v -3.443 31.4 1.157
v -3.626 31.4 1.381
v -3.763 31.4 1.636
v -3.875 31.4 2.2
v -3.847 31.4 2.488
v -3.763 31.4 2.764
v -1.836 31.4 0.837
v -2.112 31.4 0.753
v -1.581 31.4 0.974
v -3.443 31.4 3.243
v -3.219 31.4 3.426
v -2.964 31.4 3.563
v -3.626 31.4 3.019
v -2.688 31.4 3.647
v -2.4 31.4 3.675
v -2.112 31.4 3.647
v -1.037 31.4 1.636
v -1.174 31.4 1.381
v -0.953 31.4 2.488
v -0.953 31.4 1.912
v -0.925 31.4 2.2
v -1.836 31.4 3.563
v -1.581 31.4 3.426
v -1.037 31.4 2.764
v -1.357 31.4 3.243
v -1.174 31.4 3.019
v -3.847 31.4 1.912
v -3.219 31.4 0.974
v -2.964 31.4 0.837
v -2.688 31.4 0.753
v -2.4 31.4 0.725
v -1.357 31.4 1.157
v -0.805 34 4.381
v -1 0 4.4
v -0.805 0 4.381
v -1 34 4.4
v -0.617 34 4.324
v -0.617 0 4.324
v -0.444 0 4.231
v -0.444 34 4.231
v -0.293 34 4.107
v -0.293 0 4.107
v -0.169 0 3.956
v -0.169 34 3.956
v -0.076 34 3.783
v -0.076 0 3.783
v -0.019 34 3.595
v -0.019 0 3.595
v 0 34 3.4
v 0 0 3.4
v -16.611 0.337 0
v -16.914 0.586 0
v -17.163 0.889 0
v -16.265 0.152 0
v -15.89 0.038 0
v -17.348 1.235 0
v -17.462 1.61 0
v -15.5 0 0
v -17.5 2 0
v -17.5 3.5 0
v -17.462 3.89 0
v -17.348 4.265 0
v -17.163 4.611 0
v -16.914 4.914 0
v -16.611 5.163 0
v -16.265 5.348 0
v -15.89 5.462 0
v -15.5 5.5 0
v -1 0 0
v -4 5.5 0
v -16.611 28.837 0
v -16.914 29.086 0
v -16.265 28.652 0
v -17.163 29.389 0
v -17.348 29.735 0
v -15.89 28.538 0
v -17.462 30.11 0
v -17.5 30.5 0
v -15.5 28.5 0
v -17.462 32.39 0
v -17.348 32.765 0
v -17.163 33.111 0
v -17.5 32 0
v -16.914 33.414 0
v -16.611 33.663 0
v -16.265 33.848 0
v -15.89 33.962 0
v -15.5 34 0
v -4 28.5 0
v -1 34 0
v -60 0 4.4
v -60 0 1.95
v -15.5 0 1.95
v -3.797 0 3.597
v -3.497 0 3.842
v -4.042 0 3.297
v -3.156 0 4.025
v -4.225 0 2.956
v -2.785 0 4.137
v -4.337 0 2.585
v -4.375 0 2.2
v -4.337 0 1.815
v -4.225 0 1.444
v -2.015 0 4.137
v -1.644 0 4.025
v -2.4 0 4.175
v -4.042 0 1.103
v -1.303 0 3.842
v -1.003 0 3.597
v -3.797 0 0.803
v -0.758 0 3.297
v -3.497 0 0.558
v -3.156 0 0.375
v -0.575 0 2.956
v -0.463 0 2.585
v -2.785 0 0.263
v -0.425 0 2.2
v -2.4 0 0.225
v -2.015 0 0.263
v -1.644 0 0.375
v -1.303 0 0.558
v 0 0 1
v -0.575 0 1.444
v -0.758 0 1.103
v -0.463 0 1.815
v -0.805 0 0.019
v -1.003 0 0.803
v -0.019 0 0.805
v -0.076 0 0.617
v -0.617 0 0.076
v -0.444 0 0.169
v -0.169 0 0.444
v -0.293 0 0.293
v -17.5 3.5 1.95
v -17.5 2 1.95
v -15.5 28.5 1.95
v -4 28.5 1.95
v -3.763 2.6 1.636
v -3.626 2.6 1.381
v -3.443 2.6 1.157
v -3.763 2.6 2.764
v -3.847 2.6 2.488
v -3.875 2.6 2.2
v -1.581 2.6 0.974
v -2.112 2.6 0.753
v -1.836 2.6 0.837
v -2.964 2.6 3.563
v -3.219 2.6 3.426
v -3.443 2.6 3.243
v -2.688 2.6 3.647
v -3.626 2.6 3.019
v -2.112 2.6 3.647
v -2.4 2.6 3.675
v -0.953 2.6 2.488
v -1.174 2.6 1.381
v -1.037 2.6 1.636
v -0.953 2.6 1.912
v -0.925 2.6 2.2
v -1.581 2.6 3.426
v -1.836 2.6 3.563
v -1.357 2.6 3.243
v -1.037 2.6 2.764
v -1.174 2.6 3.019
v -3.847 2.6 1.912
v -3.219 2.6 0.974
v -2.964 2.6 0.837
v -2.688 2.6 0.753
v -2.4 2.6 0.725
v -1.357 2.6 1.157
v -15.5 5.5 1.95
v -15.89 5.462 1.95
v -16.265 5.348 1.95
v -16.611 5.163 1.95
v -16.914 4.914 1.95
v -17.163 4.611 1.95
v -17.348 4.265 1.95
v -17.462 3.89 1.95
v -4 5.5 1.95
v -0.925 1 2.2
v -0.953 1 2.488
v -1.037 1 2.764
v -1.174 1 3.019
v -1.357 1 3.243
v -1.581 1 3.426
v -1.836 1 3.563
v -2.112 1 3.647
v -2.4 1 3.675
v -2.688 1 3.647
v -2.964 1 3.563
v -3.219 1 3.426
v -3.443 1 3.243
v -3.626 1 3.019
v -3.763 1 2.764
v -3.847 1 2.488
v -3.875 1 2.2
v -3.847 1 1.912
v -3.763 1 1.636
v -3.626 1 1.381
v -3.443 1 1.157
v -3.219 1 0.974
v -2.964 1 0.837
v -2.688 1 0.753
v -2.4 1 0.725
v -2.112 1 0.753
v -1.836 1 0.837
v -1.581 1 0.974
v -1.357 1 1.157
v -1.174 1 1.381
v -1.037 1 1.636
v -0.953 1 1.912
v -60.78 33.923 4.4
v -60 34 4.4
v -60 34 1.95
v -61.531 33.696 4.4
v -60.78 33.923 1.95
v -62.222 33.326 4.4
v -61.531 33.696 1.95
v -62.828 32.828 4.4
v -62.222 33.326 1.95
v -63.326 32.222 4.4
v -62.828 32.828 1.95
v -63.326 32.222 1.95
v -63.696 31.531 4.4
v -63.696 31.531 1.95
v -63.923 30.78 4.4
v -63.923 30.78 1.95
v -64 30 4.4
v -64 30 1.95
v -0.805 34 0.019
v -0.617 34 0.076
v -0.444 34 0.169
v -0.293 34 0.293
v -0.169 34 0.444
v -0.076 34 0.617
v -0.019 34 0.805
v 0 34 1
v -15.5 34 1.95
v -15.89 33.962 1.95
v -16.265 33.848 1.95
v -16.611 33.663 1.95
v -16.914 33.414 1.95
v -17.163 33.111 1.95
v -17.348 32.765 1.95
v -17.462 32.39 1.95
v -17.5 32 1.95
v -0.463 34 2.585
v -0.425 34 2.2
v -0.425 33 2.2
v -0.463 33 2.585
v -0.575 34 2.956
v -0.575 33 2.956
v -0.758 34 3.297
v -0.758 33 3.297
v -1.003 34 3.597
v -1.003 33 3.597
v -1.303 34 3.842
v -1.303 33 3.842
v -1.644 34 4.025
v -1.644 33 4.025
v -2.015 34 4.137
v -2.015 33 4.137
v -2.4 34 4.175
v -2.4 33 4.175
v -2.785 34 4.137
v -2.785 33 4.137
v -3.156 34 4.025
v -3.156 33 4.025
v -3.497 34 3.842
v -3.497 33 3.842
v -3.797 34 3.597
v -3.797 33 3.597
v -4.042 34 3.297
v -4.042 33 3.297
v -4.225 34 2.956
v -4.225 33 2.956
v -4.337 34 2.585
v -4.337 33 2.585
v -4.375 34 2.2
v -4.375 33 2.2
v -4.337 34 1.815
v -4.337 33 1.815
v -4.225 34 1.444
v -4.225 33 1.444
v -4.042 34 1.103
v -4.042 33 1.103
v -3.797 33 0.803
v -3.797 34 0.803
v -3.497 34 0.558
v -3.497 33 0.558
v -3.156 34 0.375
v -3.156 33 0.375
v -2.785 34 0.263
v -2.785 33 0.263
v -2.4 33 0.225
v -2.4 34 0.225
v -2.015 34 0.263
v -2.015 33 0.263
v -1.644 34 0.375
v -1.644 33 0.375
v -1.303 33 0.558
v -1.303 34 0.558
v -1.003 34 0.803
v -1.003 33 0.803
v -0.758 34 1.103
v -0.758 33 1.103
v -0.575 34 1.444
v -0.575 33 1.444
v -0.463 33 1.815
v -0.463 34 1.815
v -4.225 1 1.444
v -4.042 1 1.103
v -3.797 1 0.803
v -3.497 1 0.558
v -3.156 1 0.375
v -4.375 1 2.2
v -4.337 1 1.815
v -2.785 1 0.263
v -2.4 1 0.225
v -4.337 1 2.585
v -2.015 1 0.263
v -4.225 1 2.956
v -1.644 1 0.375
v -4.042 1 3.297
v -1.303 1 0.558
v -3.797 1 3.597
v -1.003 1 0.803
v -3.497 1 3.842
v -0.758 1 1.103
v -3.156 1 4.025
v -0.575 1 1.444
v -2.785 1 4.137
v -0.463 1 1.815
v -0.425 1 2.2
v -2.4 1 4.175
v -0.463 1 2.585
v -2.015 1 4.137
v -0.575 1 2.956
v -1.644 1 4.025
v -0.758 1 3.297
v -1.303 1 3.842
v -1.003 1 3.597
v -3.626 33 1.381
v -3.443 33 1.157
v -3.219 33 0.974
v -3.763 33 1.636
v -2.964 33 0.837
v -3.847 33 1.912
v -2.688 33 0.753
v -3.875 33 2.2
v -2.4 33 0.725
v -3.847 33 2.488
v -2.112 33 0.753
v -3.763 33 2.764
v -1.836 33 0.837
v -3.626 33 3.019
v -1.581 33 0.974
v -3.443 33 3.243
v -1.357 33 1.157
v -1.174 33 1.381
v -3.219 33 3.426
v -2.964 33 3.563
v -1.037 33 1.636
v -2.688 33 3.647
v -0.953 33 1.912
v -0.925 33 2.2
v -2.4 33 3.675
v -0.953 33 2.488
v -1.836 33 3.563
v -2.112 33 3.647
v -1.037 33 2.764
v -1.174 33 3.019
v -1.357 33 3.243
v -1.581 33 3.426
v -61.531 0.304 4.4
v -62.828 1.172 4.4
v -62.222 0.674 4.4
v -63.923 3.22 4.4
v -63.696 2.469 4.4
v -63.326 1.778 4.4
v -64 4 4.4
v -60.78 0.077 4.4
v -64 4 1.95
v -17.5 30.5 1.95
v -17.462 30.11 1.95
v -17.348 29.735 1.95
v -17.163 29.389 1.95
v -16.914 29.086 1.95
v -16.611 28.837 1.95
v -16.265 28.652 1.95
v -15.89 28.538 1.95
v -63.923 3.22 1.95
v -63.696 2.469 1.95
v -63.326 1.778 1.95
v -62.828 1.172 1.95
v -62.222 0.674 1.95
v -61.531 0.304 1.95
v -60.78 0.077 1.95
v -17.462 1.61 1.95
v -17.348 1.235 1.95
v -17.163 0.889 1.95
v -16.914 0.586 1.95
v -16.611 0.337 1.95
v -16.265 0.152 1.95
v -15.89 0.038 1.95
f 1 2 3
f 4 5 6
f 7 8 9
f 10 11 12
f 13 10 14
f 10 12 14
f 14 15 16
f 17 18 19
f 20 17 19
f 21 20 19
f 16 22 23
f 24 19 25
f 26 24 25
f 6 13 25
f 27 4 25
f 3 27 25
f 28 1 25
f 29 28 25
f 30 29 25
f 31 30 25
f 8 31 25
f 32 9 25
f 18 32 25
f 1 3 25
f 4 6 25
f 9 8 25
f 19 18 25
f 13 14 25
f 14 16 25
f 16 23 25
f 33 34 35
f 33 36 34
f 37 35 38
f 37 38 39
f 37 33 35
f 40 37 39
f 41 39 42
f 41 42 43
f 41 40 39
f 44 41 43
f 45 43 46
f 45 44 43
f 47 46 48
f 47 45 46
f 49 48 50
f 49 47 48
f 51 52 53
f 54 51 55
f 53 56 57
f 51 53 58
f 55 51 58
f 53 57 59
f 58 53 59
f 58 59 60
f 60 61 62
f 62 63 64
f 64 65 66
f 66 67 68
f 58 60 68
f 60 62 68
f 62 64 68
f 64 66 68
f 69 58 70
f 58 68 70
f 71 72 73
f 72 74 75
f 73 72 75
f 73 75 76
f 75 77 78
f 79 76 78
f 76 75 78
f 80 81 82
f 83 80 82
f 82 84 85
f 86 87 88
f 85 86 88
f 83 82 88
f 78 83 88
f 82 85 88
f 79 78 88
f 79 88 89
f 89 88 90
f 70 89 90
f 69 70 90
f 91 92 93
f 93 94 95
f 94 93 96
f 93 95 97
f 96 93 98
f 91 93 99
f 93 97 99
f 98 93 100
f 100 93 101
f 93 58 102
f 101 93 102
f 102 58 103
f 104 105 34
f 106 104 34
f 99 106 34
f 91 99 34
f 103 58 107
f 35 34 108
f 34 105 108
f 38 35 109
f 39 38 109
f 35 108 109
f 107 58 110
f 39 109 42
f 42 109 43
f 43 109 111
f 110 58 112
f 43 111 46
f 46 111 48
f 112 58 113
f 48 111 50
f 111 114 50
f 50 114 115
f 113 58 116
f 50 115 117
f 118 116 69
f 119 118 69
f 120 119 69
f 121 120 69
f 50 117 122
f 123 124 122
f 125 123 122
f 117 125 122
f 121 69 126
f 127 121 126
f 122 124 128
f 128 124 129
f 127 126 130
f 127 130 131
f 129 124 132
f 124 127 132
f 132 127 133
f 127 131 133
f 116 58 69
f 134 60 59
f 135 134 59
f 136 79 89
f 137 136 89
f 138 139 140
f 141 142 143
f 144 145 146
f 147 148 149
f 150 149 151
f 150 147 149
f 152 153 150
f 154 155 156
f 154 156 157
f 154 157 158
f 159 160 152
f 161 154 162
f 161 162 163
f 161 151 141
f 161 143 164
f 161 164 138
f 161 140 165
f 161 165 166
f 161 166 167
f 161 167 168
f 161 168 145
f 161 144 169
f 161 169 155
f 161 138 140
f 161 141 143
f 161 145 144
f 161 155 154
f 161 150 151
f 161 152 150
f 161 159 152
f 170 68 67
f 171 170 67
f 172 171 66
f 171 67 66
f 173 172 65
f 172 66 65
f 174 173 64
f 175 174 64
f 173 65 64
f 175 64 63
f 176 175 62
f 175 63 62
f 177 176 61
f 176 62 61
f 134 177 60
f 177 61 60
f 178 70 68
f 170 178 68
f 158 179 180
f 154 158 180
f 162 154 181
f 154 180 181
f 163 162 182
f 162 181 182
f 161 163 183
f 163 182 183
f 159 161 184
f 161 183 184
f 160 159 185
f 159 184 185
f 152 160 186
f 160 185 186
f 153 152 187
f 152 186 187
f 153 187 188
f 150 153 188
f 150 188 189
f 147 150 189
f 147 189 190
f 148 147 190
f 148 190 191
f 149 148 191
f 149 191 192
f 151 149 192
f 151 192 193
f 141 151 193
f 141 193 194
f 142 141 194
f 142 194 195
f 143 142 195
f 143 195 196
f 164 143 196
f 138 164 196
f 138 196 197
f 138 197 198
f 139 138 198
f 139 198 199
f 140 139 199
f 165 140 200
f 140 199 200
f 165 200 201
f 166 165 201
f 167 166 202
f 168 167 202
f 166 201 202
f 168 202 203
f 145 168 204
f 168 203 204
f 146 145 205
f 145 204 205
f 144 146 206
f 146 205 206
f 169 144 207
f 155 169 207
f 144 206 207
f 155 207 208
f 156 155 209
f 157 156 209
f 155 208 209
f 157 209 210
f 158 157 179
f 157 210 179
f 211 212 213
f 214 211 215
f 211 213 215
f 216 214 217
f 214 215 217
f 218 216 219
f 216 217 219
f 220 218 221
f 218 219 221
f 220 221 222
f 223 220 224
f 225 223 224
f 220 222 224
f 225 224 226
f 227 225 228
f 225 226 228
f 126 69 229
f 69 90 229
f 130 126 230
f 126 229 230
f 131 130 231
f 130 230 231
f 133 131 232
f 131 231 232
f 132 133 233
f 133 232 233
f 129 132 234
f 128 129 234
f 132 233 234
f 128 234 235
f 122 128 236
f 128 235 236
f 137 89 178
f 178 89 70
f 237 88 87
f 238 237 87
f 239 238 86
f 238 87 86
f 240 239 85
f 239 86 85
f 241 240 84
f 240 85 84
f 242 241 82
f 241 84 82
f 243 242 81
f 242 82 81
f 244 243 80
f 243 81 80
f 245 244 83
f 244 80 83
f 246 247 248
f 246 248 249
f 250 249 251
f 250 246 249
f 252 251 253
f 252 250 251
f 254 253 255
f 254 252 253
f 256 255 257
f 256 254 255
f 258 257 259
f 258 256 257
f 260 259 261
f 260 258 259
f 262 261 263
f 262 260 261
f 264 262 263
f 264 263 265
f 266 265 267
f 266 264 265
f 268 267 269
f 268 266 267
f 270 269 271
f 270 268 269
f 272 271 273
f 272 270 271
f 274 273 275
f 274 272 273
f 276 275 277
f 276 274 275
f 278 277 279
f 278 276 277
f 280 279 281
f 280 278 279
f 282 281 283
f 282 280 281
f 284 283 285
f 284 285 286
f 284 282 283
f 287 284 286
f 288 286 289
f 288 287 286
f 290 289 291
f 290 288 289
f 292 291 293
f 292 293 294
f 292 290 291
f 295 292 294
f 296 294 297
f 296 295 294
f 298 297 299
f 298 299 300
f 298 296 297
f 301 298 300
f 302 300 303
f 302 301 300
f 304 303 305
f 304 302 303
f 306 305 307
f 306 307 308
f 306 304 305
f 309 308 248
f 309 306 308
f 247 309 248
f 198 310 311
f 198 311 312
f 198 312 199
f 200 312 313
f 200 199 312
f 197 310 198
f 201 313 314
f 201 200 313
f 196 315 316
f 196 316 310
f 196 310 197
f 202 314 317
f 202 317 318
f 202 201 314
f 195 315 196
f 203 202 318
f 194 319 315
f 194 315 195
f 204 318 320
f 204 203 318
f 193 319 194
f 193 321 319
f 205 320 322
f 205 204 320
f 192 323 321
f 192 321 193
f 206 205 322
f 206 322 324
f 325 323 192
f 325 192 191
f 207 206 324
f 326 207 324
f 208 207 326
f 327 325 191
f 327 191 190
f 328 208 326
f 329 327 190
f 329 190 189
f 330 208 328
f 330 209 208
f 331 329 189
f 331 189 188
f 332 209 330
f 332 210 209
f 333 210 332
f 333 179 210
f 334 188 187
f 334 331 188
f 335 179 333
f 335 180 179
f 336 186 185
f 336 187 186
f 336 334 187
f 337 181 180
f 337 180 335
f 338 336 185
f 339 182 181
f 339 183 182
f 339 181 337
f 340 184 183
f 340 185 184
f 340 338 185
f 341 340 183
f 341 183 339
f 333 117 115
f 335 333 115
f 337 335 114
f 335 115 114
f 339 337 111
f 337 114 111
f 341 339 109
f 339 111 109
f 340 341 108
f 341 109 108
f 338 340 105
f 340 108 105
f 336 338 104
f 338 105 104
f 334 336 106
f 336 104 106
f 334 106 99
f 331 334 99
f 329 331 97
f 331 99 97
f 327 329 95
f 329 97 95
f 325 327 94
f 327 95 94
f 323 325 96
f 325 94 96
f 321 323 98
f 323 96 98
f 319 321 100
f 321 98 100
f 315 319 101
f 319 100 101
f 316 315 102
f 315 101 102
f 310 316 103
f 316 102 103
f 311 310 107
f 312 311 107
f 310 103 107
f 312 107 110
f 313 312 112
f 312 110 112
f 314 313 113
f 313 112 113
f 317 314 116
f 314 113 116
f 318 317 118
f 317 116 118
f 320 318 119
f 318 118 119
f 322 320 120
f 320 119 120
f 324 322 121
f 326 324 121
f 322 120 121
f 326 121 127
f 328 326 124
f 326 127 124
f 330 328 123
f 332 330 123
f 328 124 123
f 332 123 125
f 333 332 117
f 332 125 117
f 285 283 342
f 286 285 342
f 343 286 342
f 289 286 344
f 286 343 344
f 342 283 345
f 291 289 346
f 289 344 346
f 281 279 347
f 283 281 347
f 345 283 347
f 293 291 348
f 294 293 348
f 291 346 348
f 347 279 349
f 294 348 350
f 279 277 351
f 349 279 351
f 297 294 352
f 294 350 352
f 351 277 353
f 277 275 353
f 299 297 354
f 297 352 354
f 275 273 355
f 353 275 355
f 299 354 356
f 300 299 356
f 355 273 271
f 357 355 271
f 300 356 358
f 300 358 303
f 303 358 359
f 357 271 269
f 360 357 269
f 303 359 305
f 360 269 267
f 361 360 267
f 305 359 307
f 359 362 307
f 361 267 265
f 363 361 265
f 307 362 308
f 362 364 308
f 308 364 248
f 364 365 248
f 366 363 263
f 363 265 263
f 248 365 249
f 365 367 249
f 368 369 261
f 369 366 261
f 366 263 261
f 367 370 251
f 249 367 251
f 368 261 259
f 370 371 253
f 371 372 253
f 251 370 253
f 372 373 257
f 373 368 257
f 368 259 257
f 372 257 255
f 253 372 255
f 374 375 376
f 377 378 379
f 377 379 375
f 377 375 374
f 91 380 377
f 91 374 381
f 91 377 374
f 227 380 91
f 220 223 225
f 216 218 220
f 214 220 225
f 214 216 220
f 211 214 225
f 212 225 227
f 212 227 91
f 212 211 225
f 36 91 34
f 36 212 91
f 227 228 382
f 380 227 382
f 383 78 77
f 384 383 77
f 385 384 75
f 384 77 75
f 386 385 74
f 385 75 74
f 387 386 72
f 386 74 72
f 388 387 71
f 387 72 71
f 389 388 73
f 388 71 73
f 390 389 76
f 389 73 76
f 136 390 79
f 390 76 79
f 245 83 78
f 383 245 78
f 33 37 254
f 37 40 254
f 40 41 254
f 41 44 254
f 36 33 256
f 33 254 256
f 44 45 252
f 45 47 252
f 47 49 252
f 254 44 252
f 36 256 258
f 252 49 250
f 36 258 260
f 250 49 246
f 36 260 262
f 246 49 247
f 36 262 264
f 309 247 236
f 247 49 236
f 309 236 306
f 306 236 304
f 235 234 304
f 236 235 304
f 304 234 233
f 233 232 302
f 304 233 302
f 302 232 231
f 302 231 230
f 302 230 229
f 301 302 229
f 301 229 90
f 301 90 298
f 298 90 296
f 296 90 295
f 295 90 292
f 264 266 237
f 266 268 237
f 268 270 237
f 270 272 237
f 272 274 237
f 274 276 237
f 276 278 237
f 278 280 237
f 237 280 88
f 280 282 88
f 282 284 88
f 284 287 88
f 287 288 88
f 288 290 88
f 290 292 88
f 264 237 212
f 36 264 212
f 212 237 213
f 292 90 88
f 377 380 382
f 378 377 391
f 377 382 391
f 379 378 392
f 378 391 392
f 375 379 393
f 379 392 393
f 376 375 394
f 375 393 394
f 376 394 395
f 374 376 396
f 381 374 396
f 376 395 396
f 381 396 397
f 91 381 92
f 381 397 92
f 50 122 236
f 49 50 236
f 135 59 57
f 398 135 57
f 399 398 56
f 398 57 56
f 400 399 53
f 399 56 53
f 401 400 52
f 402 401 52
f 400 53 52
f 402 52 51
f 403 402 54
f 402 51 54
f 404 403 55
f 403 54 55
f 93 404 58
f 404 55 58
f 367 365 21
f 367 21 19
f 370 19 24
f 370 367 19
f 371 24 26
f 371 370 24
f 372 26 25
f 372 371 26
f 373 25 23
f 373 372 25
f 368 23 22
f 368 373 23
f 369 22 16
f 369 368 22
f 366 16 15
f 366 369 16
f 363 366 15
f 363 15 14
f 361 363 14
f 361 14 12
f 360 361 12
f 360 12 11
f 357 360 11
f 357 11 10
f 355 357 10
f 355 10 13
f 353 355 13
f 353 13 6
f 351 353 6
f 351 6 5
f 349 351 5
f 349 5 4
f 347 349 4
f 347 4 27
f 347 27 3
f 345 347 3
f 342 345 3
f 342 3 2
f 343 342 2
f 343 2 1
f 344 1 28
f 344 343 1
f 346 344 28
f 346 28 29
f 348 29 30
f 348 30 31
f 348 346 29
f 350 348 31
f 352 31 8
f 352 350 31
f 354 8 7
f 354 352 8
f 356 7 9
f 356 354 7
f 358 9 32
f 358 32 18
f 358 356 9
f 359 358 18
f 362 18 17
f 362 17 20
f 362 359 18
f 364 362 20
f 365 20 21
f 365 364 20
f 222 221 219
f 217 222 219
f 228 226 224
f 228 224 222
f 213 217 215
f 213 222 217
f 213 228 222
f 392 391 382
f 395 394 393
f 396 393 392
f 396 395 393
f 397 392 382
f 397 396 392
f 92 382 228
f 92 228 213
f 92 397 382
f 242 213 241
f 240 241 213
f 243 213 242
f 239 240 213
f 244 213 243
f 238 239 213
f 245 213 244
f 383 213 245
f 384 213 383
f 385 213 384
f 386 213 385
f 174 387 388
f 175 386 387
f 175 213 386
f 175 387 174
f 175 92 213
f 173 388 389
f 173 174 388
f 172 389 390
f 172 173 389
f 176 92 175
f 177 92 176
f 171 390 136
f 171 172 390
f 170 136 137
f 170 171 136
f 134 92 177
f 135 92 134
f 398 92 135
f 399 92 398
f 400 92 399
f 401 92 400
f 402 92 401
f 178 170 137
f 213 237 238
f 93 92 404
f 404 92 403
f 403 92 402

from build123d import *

# Parameters (mm, degrees)
F1_DEPTH = 4.4
F3_DEPTH = 1.95
F6_R     = 1.475
F8_DEPTH = 2.6
F6_R_2   = 1.975
F9_DEPTH = 1
F10_R    = 1


# Not quite as in the source:
# - a pattern or mirror of a feature is missing from the dataset's text; its kind, count and spacing are read off the source's solid


with BuildPart() as f1:
    # F0 (on Top) → F1 (new body)
    with BuildSketch(Plane.XY):
        with BuildLine():
            Line((-60, 0), (0, 0))
            Line((0, 0), (0, 34))
            Line((0, 34), (-60, 34))
            ThreePointArc((-60, 34), (-62.8284271247, 32.8284271247), (-64, 30))
            Line((-64, 30), (-64, 4))
            ThreePointArc((-64, 4), (-62.8284271247, 1.1715728753), (-60, 0))
        make_face()
    extrude(amount=F1_DEPTH)

    # F2 (on face) → F3 (cut)
    with BuildSketch(Plane(origin=(0, 0, 0), x_dir=(1, 0, 0), z_dir=(0, 0, -1))):
        with BuildLine():
            ThreePointArc((-15.5, -34), (-16.9142135624, -33.4142135624), (-17.5, -32))
            Line((-17.5, -32), (-17.5, -30.5))
            ThreePointArc((-17.5, -30.5), (-16.9142135624, -29.0857864376), (-15.5, -28.5))
            Line((-15.5, -28.5), (-4, -28.5))
            Line((-4, -28.5), (-4, -5.5))
            Line((-4, -5.5), (-15.5, -5.5))
            ThreePointArc((-15.5, -5.5), (-16.9142135624, -4.9142135624), (-17.5, -3.5))
            Line((-17.5, -3.5), (-17.5, -2))
            ThreePointArc((-17.5, -2), (-16.9142135624, -0.5857864376), (-15.5, 0))
            Line((-15.5, 0), (-64, 0))
            Line((-64, 0), (-64, -34))
            Line((-64, -34), (-15.5, -34))
        make_face()
    extrude(amount=-F3_DEPTH, mode=Mode.SUBTRACT)

    # F6 (on face) → F8 (cut)
    with BuildSketch(Plane.XZ):
        with Locations((-2.4, 2.2)):
            Circle(F6_R)
    f8 = extrude(amount=-F8_DEPTH, mode=Mode.SUBTRACT)

    # F8_copies: F8 across plane
    add(f8.mirror(Plane.ZX.offset(17)), mode=Mode.SUBTRACT)

    # F6 (on face) → F9 (cut)
    with BuildSketch(Plane.XZ):
        with Locations((-2.4, 2.2)):
            Circle(F6_R_2)
        with Locations((-2.4, 2.2)):
            Circle(F6_R, mode=Mode.SUBTRACT)
    f9 = extrude(amount=-F9_DEPTH, mode=Mode.SUBTRACT)

    # F9_copies: F9 across plane
    add(f9.mirror(Plane.ZX.offset(17)), mode=Mode.SUBTRACT)

    # F10
    f10_edges = [f1.edges().sort_by_distance(p)[0] for p in [
        (0, 17, 4.4),
        (0, 17, 0),
    ]]
    fillet(f10_edges, radius=F10_R)


solid = f1.part
